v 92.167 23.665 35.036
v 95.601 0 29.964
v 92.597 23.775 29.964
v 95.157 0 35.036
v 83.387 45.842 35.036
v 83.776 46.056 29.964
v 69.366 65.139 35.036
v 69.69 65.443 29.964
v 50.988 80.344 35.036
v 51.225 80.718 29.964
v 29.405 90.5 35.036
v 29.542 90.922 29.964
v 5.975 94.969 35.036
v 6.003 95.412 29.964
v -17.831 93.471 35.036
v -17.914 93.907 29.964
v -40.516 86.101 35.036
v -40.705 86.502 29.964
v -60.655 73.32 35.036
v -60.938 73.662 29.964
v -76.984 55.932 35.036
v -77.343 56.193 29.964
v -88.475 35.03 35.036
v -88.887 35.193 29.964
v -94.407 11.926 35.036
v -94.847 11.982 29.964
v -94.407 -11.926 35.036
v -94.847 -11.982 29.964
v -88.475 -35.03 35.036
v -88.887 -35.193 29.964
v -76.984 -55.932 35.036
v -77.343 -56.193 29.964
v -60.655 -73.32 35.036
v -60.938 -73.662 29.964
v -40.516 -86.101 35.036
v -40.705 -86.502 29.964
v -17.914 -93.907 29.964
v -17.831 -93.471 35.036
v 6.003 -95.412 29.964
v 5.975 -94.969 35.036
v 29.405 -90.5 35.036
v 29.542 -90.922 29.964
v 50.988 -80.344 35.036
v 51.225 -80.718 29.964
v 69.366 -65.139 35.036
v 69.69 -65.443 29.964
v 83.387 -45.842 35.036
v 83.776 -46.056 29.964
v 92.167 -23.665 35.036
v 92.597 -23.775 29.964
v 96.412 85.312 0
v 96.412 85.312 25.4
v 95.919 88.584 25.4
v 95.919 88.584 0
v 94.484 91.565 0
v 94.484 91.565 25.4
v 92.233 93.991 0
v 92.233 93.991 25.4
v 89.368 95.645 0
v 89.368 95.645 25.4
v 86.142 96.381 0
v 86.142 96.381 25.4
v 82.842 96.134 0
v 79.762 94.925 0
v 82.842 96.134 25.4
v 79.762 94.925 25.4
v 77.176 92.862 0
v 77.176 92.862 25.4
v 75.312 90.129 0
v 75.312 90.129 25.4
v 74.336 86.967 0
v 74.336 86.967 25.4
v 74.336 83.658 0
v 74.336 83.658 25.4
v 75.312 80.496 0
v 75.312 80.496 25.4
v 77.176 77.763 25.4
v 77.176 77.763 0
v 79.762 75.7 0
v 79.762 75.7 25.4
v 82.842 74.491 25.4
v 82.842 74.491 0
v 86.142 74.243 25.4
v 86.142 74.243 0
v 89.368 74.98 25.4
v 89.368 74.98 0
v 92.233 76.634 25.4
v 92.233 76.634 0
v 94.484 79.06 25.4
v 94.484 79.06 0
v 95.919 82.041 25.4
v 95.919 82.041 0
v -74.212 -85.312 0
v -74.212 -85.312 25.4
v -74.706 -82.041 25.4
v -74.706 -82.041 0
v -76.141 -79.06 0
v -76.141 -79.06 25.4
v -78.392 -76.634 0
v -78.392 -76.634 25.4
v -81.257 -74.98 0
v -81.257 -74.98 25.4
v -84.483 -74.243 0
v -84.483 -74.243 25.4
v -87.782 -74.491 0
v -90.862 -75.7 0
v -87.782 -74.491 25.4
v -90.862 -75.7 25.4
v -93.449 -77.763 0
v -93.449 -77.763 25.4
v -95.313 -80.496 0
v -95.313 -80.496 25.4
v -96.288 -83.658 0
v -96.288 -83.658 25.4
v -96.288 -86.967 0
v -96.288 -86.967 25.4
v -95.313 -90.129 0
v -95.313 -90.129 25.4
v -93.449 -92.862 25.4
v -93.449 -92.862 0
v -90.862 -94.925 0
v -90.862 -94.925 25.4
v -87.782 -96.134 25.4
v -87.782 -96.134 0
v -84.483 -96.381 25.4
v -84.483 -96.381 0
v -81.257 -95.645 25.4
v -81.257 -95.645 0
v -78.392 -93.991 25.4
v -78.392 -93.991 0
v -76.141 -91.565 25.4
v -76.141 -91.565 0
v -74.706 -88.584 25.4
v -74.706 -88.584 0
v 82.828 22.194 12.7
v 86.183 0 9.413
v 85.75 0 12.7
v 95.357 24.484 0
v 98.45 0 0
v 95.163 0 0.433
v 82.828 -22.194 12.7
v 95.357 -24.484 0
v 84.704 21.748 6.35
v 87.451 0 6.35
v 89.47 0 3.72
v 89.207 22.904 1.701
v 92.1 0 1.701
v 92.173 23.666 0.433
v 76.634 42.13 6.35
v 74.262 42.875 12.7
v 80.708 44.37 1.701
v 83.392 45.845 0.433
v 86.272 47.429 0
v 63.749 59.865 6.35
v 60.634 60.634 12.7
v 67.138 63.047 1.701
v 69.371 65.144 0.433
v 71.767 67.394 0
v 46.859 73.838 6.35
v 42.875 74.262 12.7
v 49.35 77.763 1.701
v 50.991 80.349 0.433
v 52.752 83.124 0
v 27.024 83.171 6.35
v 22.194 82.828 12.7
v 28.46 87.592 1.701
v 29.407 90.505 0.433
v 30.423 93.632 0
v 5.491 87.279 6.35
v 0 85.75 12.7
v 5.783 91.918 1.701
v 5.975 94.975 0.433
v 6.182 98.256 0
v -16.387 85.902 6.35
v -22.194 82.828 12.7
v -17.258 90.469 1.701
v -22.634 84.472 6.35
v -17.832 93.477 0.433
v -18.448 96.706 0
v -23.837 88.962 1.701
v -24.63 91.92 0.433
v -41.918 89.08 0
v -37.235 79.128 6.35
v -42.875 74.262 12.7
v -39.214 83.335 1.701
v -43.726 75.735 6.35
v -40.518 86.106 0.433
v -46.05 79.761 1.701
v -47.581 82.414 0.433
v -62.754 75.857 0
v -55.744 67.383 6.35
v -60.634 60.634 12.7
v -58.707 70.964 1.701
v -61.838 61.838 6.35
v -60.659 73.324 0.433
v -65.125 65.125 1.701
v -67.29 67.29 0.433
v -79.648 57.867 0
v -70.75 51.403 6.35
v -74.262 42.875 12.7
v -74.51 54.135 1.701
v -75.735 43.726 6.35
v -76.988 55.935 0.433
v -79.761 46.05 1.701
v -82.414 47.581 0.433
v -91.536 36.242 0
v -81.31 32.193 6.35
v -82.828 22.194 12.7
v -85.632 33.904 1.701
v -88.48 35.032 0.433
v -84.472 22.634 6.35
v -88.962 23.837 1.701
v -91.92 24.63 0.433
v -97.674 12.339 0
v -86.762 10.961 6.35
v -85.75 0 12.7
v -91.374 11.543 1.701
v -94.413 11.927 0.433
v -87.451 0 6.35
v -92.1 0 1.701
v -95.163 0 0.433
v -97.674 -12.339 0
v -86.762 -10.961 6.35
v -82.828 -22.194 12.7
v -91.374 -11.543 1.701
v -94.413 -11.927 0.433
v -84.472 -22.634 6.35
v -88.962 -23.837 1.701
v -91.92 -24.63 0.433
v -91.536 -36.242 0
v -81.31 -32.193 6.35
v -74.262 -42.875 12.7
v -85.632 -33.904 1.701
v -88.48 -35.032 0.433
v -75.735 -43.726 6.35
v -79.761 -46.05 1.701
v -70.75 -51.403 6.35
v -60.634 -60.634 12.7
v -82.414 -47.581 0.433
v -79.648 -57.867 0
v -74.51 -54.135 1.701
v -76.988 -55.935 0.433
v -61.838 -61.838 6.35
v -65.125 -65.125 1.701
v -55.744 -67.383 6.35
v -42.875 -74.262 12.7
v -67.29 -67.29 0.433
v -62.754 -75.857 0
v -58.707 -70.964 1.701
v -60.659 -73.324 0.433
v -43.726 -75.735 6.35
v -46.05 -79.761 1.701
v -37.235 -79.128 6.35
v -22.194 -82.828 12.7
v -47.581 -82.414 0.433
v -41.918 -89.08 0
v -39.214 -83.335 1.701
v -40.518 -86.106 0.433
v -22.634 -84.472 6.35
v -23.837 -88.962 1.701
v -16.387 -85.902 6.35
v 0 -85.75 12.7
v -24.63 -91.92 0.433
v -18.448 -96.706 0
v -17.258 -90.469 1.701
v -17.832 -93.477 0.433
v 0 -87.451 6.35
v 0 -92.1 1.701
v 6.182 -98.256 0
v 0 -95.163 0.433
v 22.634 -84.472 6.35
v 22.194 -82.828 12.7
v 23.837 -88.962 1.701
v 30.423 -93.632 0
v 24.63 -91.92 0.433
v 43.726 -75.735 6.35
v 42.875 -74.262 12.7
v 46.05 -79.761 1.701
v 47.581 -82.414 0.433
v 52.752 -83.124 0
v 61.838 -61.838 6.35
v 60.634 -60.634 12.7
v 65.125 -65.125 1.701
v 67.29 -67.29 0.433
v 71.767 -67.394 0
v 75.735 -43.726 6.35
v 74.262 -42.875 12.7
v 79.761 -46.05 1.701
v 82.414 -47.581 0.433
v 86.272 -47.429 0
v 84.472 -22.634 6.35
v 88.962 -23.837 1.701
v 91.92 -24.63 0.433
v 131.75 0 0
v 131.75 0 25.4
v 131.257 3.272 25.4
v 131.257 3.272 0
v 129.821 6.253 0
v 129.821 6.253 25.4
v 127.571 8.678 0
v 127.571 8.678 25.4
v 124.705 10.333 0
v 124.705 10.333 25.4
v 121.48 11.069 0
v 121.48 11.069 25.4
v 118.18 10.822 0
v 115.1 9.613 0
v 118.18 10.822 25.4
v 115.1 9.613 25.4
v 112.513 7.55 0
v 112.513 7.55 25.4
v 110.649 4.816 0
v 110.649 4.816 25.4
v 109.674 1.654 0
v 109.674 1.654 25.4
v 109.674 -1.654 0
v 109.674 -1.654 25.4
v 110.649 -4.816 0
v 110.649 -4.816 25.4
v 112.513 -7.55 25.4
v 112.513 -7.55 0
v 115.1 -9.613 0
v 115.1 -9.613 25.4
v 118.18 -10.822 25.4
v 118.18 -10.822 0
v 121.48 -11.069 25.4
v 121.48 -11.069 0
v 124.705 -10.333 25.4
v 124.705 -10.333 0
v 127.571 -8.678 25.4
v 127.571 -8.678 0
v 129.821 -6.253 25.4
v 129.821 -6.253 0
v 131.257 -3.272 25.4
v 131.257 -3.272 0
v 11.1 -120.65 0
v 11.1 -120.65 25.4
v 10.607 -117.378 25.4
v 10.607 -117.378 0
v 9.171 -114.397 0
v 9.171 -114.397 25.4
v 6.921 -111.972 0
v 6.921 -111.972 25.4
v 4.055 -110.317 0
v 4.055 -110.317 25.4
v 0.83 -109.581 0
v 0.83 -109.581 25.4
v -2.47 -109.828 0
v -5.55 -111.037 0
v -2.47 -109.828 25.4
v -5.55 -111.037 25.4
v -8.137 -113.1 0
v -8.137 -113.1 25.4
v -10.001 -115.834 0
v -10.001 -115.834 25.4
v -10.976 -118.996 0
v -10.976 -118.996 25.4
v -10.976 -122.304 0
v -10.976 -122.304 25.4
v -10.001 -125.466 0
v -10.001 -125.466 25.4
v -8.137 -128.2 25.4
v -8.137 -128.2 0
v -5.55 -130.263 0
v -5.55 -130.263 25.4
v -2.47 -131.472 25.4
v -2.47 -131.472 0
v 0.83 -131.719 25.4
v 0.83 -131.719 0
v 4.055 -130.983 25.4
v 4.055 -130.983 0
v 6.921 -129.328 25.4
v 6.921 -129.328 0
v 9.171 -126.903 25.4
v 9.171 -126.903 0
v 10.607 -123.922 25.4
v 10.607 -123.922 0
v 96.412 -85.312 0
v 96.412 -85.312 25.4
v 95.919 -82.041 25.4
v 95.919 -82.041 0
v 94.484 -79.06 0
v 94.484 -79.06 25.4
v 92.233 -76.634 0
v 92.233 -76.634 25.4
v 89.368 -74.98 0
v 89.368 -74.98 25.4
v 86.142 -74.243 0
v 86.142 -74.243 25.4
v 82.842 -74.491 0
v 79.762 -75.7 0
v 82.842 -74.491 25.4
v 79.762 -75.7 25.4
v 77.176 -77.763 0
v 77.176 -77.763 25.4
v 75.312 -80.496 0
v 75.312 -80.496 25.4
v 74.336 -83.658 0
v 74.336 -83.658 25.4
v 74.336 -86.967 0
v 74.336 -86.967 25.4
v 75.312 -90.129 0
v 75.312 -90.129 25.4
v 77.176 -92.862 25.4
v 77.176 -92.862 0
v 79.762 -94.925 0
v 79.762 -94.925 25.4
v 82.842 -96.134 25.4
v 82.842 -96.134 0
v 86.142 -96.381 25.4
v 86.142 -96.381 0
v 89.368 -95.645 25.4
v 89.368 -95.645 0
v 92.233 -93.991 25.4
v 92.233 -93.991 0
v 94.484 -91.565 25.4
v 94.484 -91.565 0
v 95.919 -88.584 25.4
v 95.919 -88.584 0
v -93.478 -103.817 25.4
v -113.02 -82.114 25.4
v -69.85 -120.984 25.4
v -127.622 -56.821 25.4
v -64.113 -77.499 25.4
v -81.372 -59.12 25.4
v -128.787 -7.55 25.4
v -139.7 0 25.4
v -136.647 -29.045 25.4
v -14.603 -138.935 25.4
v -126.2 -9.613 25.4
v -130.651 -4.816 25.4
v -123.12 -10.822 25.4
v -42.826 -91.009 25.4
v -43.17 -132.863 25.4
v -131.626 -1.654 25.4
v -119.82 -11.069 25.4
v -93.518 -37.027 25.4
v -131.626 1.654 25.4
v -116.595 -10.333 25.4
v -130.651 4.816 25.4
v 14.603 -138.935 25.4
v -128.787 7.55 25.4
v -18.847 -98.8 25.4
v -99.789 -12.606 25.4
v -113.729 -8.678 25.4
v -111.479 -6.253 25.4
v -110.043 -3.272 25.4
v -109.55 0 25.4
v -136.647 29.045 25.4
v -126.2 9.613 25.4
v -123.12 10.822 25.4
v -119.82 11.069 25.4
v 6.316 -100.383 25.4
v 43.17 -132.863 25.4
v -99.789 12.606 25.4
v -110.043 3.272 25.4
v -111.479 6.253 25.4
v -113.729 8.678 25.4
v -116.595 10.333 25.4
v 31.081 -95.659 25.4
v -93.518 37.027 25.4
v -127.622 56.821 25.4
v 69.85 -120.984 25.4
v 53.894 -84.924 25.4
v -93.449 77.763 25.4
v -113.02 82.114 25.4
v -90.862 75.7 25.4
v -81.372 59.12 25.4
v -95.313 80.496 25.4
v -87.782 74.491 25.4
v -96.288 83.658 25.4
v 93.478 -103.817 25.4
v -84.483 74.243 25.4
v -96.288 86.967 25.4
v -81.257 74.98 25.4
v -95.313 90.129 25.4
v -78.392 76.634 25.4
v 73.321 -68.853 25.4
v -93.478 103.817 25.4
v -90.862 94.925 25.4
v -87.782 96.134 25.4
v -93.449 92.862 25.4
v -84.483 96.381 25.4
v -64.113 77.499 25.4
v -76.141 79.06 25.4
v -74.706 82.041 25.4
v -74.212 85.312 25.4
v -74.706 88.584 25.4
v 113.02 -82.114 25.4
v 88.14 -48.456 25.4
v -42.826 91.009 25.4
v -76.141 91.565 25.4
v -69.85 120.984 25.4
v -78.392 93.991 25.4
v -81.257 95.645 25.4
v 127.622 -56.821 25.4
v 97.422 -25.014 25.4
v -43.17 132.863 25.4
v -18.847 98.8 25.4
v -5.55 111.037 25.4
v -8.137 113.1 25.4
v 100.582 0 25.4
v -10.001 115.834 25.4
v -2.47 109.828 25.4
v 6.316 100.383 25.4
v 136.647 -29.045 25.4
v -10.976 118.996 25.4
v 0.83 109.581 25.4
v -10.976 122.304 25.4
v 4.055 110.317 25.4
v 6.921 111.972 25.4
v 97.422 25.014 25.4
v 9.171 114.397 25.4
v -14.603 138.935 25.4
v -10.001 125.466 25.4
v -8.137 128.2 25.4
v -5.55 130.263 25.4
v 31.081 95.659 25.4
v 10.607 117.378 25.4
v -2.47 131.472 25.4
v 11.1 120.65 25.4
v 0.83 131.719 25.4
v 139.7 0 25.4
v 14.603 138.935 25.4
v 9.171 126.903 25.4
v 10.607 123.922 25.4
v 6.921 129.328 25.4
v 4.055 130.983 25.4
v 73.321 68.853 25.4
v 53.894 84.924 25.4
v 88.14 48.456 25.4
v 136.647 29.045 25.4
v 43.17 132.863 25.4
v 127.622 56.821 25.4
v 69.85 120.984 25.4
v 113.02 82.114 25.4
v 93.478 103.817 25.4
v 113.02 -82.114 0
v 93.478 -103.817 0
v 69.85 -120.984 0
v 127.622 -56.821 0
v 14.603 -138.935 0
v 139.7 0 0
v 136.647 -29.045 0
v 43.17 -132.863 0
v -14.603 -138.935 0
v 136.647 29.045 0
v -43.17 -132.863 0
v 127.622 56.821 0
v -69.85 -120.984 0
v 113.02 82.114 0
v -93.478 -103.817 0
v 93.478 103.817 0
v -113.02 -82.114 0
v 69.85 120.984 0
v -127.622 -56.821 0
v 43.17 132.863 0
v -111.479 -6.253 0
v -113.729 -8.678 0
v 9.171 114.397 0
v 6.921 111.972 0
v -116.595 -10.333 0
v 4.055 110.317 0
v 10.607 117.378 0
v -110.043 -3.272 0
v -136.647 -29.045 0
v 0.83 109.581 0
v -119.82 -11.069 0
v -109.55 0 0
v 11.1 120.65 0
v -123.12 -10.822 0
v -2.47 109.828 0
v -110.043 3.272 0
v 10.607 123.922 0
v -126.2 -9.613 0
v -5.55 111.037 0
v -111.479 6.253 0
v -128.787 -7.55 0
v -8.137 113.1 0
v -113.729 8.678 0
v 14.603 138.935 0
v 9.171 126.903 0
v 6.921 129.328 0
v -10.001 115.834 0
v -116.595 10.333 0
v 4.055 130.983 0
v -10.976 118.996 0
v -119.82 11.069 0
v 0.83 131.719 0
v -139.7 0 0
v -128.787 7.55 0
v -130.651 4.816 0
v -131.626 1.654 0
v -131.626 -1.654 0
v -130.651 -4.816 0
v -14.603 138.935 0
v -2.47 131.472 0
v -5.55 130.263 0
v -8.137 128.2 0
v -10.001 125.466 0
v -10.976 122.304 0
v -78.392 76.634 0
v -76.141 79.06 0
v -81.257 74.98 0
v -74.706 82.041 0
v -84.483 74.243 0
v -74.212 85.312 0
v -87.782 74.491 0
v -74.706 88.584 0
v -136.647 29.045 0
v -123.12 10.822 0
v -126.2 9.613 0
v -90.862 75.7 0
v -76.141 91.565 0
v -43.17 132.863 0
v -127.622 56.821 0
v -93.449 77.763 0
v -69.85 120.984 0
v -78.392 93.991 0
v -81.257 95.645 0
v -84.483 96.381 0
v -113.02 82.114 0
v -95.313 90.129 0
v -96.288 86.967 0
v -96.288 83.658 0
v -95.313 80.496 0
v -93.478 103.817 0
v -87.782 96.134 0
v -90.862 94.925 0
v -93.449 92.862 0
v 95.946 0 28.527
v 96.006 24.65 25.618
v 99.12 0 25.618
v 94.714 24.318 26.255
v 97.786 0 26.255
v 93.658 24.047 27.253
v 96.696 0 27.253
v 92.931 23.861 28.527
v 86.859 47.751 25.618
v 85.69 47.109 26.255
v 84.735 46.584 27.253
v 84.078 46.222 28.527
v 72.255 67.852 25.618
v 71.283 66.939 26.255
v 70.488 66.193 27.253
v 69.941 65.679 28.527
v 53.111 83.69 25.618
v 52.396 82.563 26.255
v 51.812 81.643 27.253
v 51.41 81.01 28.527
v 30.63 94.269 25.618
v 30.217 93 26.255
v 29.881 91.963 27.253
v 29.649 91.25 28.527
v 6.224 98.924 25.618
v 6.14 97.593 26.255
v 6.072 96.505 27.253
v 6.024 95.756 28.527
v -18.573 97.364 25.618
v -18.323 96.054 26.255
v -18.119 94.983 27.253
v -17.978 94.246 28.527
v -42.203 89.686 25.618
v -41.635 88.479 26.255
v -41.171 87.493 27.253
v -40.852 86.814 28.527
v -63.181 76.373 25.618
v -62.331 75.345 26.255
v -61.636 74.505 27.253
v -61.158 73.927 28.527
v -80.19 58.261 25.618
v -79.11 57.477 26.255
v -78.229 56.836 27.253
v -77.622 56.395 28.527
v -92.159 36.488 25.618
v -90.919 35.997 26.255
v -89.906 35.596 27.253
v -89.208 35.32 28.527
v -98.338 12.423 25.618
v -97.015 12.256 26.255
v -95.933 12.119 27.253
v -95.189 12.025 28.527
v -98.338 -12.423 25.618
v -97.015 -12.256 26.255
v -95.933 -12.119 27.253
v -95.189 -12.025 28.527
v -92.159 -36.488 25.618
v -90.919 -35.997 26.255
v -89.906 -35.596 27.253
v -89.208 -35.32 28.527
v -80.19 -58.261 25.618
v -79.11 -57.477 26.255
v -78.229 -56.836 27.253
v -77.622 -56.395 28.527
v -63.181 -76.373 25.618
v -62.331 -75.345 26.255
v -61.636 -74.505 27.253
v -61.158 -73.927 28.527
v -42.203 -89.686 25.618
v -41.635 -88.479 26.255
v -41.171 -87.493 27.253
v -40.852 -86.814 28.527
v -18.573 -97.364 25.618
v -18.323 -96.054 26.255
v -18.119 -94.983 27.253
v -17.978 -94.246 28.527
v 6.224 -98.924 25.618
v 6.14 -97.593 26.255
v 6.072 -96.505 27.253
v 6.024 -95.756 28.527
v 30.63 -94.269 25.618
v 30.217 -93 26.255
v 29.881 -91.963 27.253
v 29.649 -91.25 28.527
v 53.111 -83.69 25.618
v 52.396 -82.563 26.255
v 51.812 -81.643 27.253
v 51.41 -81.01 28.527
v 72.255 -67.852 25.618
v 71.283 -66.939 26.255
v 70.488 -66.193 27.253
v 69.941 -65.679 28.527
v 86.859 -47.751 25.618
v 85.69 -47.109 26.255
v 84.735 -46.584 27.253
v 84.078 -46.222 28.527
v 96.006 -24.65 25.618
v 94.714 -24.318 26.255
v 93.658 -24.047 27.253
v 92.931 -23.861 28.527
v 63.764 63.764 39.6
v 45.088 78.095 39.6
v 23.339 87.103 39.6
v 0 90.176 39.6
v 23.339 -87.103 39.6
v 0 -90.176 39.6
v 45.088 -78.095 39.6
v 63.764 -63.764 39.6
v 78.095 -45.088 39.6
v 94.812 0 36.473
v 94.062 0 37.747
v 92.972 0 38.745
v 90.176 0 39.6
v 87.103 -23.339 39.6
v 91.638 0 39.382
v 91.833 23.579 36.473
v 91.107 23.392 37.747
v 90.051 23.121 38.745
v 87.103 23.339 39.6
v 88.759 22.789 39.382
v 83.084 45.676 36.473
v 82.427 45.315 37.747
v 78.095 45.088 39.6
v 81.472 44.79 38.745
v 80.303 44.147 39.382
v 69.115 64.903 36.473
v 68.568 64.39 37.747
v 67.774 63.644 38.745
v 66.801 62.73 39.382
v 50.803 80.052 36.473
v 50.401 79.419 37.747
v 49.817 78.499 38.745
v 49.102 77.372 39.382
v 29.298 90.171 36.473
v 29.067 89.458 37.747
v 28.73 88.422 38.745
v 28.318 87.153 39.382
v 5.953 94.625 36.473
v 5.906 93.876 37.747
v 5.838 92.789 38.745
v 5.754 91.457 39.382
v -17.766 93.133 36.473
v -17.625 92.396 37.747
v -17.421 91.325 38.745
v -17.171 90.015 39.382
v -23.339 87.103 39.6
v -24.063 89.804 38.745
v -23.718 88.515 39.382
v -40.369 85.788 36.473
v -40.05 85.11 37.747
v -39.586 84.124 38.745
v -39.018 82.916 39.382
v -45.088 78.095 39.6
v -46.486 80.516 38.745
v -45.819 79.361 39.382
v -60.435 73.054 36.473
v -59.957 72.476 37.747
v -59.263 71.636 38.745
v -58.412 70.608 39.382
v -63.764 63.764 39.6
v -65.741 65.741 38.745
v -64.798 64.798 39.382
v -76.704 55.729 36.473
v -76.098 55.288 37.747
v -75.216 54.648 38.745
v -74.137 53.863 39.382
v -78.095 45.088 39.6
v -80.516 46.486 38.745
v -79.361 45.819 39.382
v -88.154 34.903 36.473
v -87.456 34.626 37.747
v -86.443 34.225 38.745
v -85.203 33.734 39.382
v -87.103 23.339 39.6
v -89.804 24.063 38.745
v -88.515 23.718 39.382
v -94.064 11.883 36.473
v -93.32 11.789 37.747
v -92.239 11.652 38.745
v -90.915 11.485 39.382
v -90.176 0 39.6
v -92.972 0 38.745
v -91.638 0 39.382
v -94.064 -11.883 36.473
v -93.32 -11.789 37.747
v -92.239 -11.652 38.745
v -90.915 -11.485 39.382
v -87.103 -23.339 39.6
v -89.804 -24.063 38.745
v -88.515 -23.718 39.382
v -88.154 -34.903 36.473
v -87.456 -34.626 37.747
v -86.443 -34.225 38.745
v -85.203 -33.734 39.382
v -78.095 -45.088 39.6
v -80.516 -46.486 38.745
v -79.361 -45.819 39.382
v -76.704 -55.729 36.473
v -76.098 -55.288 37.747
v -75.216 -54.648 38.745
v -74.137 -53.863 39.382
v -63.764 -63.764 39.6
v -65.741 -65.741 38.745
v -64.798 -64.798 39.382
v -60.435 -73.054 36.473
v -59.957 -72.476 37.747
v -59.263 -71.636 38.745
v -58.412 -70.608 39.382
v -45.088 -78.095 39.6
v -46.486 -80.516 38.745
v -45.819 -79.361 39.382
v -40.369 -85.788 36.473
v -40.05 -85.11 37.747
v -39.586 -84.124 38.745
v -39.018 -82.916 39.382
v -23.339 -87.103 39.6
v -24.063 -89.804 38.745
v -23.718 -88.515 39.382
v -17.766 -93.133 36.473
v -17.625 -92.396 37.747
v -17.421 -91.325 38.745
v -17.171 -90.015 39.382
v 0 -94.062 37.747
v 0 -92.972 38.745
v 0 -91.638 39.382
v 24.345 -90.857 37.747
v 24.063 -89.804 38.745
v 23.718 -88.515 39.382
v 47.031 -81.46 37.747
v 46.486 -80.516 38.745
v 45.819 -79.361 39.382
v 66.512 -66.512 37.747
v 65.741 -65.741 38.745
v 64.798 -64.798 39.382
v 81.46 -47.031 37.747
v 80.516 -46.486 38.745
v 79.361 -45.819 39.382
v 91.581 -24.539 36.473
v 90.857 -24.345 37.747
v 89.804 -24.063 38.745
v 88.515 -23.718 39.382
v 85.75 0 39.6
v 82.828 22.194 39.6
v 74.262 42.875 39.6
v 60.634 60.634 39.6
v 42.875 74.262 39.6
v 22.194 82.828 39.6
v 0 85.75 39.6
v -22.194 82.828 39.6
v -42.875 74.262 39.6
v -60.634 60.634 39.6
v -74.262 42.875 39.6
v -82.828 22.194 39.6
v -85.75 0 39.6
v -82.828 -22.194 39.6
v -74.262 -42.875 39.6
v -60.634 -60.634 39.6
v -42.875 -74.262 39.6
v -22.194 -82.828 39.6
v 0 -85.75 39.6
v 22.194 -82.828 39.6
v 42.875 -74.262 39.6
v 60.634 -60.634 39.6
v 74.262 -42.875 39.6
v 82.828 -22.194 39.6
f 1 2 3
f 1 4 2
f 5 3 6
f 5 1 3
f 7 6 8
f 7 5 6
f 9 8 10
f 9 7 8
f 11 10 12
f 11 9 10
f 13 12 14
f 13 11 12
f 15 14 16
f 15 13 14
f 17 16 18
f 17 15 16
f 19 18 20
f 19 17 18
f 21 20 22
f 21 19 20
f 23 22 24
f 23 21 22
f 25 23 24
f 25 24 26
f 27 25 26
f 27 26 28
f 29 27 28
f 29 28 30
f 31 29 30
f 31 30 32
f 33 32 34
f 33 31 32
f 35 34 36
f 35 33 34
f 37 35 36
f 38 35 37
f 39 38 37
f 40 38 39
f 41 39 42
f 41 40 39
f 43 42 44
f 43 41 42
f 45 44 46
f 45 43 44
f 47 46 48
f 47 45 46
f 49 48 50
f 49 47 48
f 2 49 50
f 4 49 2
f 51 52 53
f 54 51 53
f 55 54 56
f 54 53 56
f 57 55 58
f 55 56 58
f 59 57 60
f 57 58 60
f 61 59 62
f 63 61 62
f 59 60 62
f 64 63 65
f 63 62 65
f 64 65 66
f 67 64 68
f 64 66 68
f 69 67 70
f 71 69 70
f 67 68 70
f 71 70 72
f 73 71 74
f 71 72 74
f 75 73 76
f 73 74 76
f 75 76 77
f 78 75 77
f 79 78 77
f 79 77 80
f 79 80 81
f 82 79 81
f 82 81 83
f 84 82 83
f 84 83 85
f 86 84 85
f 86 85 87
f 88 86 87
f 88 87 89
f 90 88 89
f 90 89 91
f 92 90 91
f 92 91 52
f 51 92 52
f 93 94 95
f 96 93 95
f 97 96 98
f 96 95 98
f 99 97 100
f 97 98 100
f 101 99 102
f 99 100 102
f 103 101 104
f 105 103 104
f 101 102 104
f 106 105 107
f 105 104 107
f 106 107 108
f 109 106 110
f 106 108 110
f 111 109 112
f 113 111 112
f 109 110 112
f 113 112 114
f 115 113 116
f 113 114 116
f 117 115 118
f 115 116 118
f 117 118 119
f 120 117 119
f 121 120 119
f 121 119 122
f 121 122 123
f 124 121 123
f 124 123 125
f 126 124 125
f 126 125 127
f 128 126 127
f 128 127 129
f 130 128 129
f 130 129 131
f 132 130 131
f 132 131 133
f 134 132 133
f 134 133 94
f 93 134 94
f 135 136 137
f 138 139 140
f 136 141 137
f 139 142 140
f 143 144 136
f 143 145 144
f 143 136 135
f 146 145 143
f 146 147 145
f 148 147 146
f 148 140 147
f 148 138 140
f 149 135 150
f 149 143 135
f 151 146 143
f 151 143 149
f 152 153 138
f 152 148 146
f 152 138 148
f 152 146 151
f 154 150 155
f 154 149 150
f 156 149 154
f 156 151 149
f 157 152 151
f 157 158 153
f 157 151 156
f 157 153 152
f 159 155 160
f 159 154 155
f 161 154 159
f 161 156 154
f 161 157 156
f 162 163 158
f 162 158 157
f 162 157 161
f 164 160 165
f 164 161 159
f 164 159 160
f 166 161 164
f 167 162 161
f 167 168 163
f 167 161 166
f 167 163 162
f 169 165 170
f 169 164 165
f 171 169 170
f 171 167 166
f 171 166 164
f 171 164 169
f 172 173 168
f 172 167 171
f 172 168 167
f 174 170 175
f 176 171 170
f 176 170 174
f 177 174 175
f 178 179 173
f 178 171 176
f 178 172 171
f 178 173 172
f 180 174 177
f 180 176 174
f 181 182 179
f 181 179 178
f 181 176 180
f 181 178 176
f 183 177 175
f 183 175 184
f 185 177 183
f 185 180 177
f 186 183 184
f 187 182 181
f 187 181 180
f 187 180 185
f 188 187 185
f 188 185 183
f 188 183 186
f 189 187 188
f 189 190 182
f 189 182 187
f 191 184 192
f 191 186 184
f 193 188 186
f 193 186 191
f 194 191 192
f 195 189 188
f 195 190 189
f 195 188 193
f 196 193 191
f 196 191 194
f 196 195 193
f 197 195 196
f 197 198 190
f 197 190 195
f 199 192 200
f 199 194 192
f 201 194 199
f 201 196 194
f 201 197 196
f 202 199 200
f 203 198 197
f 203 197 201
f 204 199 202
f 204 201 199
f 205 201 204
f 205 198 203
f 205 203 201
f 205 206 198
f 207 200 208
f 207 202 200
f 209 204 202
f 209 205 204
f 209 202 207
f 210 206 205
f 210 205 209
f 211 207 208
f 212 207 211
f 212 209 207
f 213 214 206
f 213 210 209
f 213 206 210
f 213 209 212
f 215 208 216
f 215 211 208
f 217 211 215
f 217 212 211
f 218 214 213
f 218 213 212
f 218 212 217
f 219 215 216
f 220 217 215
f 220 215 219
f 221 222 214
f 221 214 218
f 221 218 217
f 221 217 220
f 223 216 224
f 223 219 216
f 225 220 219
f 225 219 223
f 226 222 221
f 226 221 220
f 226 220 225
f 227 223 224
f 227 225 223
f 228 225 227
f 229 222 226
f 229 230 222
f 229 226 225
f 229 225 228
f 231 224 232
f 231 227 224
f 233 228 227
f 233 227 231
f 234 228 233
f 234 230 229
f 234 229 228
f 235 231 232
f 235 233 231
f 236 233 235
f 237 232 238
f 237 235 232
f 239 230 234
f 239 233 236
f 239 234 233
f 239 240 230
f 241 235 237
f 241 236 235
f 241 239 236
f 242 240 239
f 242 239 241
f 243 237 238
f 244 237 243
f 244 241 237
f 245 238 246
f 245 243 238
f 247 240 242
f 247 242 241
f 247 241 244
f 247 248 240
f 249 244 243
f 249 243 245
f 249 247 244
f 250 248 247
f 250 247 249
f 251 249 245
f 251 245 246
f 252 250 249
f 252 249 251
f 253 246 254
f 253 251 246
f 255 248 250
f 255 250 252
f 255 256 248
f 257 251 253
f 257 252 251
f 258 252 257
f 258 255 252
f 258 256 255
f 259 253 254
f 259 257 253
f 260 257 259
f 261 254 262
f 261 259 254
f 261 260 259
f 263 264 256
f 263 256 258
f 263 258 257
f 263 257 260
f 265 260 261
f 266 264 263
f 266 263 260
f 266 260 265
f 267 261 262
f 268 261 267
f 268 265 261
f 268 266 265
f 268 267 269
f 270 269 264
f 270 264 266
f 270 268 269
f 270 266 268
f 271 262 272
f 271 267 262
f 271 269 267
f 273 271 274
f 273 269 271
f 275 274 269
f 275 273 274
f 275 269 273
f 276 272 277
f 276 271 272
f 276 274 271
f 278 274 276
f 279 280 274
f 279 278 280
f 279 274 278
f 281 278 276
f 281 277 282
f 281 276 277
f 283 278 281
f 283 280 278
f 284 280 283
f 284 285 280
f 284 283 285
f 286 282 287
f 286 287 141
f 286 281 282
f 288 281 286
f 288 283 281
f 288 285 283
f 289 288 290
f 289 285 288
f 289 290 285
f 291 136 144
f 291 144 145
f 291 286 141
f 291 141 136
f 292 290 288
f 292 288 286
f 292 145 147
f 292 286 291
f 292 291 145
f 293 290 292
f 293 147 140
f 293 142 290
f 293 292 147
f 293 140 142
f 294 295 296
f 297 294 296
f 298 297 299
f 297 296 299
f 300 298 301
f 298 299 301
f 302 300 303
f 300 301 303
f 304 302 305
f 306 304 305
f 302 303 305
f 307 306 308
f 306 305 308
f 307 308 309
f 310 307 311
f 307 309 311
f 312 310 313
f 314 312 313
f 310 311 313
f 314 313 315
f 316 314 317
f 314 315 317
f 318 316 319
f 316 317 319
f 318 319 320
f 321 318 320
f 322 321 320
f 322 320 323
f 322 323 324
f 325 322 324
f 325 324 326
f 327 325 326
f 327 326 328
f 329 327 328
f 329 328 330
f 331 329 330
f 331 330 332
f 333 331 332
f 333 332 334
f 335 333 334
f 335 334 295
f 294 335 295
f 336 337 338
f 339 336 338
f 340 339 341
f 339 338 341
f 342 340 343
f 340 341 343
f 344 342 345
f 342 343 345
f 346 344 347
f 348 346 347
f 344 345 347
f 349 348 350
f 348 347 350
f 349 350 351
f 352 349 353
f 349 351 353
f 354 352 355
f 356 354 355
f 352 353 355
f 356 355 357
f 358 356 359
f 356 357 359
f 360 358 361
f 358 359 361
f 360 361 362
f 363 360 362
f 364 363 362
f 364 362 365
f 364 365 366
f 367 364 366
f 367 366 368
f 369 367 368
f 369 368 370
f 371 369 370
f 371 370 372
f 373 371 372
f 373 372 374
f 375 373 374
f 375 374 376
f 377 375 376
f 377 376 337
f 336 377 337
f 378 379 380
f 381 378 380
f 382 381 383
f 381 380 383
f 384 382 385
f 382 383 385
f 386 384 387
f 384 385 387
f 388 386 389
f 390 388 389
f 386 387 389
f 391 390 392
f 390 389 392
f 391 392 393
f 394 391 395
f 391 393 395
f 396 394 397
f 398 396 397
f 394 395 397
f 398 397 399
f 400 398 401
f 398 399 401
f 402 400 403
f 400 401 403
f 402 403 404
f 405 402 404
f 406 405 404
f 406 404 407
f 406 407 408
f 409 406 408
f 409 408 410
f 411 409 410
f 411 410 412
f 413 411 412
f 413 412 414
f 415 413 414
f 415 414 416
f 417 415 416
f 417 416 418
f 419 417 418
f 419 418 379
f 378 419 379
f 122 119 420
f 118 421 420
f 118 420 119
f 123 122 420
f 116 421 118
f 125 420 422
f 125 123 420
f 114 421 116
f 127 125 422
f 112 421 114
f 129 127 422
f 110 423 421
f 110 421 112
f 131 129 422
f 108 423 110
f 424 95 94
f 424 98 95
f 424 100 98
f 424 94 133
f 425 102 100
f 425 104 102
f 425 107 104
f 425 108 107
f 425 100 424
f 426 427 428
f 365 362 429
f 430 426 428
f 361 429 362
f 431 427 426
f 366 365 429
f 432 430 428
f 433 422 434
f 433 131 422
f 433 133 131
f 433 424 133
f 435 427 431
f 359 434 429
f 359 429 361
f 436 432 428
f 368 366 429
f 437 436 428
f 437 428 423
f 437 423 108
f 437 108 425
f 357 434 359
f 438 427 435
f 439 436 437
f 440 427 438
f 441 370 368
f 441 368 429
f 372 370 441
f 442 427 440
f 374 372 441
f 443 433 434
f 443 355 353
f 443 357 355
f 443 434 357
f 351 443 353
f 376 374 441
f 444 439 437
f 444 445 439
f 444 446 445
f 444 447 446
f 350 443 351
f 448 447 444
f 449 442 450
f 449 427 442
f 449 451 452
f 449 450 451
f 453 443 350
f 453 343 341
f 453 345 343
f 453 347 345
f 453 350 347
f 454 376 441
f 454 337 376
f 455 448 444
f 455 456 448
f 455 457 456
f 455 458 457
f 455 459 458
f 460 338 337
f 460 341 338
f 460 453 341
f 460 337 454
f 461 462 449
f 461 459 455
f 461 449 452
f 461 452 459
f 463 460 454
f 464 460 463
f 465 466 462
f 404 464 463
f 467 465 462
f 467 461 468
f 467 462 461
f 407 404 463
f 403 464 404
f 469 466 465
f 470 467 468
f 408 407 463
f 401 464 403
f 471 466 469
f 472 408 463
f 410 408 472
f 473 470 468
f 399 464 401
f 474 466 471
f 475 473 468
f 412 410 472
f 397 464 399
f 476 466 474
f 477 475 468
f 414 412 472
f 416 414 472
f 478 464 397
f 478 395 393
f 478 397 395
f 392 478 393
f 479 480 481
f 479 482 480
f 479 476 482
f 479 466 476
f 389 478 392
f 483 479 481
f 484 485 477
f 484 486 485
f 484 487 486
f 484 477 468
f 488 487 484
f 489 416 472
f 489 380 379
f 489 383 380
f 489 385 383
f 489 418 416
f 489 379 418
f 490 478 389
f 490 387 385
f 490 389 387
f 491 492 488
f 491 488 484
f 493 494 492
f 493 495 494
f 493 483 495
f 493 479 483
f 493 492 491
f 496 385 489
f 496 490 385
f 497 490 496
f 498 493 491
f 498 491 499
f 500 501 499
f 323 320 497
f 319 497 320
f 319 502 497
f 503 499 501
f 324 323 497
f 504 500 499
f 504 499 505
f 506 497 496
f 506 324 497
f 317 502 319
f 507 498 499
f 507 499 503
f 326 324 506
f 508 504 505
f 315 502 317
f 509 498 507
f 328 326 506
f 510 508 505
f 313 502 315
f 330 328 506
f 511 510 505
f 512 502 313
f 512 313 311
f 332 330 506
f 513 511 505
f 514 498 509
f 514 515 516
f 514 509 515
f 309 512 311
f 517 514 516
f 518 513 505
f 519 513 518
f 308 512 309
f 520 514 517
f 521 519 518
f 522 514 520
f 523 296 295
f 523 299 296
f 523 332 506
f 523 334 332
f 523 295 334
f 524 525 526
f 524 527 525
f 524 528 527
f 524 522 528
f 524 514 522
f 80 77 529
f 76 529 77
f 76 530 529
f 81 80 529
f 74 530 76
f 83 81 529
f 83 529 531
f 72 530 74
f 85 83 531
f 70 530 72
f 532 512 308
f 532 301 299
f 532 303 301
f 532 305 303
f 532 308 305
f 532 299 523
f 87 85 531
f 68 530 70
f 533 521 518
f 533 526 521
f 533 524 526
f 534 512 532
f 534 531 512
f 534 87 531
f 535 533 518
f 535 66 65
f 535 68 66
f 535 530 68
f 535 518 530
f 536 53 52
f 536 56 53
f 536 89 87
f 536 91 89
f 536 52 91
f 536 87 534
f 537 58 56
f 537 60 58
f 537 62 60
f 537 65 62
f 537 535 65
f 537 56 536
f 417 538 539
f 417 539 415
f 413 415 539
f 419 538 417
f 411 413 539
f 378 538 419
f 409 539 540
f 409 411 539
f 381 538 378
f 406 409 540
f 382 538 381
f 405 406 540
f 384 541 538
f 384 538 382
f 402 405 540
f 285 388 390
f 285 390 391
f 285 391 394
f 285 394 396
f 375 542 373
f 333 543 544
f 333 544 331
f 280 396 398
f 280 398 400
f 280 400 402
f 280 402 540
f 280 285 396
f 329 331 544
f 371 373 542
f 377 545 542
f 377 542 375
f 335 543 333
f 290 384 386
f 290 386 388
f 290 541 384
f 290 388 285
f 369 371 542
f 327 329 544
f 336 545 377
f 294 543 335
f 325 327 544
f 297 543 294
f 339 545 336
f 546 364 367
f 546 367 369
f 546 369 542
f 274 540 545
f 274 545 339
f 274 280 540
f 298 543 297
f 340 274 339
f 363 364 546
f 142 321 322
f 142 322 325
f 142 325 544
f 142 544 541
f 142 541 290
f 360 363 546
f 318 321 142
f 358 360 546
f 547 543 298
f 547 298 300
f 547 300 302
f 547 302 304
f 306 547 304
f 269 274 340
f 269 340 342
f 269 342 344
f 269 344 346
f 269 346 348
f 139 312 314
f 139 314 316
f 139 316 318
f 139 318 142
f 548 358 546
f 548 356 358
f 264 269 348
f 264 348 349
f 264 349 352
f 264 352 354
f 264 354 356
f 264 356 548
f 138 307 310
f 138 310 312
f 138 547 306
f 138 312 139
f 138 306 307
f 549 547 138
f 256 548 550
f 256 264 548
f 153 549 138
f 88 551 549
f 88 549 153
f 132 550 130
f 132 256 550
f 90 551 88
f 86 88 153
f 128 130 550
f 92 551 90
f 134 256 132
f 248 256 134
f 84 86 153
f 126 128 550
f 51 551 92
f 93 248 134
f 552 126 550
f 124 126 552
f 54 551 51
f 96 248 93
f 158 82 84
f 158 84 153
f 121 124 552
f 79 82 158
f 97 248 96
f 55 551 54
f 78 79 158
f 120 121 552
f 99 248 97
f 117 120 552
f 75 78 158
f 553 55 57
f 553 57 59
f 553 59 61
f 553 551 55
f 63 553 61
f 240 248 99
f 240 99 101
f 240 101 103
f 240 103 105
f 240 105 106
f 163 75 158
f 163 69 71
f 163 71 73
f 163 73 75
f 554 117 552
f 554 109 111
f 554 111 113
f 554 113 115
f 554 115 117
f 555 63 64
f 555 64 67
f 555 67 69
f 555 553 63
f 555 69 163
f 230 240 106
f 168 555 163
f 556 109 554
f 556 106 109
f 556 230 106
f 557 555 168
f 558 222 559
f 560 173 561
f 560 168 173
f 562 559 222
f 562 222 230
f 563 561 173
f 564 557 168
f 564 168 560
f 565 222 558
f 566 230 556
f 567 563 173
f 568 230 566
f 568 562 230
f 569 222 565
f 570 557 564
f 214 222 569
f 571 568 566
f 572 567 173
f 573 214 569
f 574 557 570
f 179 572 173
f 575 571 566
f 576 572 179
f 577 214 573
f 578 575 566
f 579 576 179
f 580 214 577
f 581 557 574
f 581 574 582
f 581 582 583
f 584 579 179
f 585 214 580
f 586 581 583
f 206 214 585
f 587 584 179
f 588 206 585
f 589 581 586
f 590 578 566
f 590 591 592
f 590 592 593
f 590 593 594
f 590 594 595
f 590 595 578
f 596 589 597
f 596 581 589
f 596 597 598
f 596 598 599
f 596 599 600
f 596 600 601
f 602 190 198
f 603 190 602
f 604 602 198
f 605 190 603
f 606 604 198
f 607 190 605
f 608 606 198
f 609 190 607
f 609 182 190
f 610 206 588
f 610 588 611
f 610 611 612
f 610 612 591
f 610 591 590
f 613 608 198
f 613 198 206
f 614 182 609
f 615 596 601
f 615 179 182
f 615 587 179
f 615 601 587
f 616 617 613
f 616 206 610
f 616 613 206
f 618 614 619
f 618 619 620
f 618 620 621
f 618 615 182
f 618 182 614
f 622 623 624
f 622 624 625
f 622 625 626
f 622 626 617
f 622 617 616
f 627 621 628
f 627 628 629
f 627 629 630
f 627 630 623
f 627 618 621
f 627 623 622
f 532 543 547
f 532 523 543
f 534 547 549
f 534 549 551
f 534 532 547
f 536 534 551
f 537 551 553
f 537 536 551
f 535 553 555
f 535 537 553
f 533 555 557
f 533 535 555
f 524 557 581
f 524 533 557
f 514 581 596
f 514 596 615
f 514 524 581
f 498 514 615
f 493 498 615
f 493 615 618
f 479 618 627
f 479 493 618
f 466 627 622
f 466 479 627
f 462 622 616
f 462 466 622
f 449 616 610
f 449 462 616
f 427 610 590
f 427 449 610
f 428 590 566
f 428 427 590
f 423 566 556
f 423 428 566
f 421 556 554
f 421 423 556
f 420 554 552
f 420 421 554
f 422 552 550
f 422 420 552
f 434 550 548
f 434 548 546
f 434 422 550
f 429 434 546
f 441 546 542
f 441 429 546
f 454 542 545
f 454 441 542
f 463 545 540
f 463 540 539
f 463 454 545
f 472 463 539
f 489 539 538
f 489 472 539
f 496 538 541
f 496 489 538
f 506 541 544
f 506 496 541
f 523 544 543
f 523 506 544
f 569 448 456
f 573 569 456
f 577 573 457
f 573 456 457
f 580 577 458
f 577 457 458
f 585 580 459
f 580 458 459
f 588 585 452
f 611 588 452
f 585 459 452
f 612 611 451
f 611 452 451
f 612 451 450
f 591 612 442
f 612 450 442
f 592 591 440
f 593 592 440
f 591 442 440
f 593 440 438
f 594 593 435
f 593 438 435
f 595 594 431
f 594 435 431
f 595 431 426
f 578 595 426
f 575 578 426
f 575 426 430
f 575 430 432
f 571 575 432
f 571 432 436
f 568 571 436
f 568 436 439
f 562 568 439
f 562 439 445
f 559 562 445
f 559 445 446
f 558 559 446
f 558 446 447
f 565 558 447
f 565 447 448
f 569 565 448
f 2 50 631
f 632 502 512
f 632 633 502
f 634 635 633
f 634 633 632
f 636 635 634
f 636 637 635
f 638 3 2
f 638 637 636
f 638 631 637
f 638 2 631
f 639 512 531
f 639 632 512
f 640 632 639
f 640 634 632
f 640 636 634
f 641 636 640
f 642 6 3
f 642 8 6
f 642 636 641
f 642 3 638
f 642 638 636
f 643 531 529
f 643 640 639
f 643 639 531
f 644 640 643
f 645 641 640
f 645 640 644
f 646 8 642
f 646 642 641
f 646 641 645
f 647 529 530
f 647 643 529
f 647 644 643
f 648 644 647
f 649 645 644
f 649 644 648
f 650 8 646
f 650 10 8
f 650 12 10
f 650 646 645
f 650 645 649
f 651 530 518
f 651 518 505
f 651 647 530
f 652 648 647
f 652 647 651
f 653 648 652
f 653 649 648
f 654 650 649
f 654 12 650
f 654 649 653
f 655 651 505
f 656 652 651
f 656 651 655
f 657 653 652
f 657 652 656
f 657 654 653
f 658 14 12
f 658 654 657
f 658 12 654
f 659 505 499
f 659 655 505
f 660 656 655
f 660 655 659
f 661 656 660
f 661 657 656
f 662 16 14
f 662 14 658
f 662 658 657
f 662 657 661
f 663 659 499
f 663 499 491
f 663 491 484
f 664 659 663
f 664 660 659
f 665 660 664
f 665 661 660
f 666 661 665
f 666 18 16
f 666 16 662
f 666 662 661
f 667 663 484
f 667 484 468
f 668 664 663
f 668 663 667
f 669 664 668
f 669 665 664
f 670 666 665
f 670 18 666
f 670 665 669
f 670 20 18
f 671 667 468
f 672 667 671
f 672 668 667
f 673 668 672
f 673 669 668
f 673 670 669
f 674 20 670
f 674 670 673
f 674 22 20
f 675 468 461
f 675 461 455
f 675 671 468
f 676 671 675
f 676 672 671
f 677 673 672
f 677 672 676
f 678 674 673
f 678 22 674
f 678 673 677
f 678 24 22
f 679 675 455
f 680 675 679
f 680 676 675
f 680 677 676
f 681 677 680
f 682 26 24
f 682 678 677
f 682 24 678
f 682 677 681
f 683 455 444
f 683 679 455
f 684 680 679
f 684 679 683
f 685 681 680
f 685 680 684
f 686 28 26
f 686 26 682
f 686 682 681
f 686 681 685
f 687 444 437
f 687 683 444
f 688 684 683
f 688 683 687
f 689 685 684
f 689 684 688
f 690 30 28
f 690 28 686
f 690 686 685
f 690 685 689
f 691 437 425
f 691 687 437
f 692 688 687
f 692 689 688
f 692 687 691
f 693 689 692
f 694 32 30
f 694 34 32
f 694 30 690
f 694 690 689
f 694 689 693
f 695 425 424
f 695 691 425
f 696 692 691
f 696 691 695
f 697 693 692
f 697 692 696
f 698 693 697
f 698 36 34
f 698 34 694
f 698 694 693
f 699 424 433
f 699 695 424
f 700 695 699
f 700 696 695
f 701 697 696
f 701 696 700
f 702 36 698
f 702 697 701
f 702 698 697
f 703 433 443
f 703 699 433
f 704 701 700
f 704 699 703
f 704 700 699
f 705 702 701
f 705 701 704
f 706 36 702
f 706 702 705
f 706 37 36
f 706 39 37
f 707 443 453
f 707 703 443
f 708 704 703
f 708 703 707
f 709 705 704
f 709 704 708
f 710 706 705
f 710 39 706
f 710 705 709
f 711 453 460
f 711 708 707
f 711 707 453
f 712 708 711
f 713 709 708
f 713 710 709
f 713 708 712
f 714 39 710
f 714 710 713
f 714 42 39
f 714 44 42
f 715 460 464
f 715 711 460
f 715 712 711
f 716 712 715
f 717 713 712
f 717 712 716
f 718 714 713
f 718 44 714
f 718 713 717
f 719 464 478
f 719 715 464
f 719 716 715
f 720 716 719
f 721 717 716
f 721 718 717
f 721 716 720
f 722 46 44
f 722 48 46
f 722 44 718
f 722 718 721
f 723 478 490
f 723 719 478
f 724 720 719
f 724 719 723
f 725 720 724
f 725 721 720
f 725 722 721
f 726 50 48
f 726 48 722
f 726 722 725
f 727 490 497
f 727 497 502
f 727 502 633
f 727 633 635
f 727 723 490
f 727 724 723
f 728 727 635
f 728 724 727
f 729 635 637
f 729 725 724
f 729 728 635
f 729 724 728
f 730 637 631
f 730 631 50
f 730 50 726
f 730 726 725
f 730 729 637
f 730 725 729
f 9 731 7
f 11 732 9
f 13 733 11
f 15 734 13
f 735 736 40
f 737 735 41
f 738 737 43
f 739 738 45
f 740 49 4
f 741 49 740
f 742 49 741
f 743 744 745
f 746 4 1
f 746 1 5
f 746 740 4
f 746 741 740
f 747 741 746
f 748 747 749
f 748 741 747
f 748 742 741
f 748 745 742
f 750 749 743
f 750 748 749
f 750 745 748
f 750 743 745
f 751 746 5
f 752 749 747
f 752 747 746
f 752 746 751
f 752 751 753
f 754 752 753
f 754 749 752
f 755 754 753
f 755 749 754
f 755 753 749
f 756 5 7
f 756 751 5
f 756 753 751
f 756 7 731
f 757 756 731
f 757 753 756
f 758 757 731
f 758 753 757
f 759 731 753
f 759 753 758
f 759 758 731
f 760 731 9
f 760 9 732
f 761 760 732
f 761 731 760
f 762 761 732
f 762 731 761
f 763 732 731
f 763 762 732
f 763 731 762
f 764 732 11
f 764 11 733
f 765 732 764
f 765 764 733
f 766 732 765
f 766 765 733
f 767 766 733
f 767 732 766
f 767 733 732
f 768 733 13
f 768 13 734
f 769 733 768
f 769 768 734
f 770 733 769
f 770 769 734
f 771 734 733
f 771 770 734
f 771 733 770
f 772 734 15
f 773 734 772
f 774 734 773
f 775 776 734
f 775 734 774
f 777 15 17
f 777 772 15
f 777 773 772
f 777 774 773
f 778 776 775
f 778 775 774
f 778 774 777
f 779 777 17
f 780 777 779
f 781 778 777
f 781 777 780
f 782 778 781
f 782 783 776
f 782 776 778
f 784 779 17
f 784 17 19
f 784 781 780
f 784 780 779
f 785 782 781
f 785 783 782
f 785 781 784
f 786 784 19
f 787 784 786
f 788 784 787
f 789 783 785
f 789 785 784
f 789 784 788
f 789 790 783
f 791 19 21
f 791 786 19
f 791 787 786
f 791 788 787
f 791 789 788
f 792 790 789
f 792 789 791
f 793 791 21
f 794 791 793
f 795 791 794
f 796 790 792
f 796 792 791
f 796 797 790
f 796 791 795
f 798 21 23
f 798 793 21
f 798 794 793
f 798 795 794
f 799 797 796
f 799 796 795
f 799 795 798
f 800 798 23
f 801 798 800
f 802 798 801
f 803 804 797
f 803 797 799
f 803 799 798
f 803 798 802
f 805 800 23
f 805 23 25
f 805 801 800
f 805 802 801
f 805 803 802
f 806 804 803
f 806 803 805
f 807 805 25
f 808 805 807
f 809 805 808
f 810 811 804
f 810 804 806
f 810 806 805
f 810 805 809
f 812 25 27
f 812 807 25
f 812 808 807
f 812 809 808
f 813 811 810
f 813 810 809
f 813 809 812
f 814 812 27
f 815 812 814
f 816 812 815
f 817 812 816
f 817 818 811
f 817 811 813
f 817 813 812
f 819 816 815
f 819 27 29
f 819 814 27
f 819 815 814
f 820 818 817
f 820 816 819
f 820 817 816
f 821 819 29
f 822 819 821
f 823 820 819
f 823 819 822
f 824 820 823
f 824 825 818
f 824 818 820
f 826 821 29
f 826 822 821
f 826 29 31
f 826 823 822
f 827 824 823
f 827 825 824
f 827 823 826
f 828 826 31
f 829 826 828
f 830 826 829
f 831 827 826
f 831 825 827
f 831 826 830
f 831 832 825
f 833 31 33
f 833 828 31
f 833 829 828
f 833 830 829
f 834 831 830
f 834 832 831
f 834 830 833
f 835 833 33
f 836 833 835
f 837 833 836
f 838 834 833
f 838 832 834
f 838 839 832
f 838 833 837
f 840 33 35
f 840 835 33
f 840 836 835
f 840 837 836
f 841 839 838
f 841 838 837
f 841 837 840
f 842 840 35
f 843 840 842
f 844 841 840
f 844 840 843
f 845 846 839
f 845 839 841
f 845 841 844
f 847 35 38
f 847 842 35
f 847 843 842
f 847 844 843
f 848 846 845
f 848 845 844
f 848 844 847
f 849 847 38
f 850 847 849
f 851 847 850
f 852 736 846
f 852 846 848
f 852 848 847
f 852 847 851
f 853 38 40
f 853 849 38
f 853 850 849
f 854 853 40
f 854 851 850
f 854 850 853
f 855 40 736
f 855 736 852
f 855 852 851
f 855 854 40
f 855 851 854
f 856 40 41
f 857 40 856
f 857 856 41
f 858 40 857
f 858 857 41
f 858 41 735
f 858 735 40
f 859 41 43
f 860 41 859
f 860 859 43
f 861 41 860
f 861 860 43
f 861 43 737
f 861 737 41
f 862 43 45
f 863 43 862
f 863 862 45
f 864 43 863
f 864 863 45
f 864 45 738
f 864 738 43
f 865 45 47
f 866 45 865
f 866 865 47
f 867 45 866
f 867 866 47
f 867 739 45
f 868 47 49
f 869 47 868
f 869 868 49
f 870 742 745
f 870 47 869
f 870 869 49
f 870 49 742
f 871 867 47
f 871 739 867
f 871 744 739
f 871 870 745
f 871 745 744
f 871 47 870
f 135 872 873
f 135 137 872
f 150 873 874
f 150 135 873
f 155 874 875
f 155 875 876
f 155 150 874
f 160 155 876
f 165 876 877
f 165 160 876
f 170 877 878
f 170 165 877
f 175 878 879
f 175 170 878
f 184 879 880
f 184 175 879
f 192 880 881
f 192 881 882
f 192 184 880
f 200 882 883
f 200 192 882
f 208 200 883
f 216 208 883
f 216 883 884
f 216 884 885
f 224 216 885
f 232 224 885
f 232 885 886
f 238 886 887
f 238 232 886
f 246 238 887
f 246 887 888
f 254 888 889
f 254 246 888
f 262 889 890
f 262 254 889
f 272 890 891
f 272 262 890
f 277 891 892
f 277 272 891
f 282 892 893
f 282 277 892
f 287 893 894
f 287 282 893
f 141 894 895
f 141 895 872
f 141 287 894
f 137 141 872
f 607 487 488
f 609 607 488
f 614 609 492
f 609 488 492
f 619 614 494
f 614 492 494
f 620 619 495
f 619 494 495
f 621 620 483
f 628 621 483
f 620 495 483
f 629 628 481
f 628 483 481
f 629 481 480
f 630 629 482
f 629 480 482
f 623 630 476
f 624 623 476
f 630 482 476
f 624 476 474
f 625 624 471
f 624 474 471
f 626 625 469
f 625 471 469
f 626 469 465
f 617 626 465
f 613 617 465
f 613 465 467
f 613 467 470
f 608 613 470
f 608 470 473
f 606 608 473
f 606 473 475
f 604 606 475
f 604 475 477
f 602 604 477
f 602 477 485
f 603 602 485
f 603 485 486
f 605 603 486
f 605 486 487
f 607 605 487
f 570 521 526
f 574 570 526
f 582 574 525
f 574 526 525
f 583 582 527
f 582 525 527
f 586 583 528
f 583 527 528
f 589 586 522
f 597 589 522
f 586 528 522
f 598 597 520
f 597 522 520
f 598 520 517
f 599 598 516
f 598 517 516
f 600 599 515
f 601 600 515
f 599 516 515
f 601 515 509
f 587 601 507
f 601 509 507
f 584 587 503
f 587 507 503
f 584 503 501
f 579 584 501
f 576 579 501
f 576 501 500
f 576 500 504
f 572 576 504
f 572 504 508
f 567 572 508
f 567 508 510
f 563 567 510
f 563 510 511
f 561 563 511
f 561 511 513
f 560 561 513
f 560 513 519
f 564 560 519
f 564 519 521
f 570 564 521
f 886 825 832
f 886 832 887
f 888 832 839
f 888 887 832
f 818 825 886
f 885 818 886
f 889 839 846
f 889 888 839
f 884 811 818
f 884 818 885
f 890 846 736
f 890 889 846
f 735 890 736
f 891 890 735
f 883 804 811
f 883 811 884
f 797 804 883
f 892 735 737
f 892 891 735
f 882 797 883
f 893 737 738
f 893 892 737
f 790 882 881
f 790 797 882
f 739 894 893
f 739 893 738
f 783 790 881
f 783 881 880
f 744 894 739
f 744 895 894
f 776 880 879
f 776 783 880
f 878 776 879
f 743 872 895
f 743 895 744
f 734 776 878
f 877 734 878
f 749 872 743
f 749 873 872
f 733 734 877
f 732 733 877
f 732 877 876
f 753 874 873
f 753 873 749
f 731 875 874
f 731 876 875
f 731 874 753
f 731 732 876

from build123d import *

# Parameters (mm, degrees)
F2_R     = 11.1
F3_DEPTH = 25.401


# Not quite as in the source:
# - a feature names something its author has since deleted; it is built from what else it names


with BuildPart() as f1:
    # F0 (on Front) → F1 (revolve)
    with BuildSketch(Plane.XZ):
        with BuildLine():
            ThreePointArc((85.75, 12.7), (89.4697438789, 3.7197438789), (98.45, 0))
            Line((98.45, 0), (139.7, 0))
            Line((139.7, 0), (139.7, 25.4))
            Line((139.7, 25.4), (100.5816558701, 25.4))
            ThreePointArc((100.5816558701, 25.4), (97.203704832, 26.7136133159), (95.6006823796, 29.9642212863))
            Line((95.6006823796, 29.9642212863), (95.1569785983, 35.0357787137))
            ThreePointArc((95.1569785983, 35.0357787137), (93.5539561459, 38.2863866841), (90.1760051078, 39.6))
            Line((90.1760051078, 39.6), (85.75, 39.6))
            Line((85.75, 39.6), (85.75, 12.7))
        make_face()
    revolve(axis=Axis((0, 0, 19.8), (0, 0, 1)))

    # F2 (on face) → F3 (cut, through all)
    with BuildSketch(Plane.XY.offset(25.4)):
        with Locations((0, 120.65)):
            Circle(F2_R)
        with Locations((-85.3124331502, 85.3124331502)):
            Circle(F2_R)
        with Locations((-120.65, 0)):
            Circle(F2_R)
        with Locations((-85.3124331502, -85.3124331502)):
            Circle(F2_R)
        with Locations((0, -120.65)):
            Circle(F2_R)
        with Locations((85.3124331502, -85.3124331502)):
            Circle(F2_R)
        with Locations((120.65, 0)):
            Circle(F2_R)
        with Locations((85.3124331502, 85.3124331502)):
            Circle(F2_R)
    extrude(amount=-F3_DEPTH, mode=Mode.SUBTRACT)


solid = f1.part
